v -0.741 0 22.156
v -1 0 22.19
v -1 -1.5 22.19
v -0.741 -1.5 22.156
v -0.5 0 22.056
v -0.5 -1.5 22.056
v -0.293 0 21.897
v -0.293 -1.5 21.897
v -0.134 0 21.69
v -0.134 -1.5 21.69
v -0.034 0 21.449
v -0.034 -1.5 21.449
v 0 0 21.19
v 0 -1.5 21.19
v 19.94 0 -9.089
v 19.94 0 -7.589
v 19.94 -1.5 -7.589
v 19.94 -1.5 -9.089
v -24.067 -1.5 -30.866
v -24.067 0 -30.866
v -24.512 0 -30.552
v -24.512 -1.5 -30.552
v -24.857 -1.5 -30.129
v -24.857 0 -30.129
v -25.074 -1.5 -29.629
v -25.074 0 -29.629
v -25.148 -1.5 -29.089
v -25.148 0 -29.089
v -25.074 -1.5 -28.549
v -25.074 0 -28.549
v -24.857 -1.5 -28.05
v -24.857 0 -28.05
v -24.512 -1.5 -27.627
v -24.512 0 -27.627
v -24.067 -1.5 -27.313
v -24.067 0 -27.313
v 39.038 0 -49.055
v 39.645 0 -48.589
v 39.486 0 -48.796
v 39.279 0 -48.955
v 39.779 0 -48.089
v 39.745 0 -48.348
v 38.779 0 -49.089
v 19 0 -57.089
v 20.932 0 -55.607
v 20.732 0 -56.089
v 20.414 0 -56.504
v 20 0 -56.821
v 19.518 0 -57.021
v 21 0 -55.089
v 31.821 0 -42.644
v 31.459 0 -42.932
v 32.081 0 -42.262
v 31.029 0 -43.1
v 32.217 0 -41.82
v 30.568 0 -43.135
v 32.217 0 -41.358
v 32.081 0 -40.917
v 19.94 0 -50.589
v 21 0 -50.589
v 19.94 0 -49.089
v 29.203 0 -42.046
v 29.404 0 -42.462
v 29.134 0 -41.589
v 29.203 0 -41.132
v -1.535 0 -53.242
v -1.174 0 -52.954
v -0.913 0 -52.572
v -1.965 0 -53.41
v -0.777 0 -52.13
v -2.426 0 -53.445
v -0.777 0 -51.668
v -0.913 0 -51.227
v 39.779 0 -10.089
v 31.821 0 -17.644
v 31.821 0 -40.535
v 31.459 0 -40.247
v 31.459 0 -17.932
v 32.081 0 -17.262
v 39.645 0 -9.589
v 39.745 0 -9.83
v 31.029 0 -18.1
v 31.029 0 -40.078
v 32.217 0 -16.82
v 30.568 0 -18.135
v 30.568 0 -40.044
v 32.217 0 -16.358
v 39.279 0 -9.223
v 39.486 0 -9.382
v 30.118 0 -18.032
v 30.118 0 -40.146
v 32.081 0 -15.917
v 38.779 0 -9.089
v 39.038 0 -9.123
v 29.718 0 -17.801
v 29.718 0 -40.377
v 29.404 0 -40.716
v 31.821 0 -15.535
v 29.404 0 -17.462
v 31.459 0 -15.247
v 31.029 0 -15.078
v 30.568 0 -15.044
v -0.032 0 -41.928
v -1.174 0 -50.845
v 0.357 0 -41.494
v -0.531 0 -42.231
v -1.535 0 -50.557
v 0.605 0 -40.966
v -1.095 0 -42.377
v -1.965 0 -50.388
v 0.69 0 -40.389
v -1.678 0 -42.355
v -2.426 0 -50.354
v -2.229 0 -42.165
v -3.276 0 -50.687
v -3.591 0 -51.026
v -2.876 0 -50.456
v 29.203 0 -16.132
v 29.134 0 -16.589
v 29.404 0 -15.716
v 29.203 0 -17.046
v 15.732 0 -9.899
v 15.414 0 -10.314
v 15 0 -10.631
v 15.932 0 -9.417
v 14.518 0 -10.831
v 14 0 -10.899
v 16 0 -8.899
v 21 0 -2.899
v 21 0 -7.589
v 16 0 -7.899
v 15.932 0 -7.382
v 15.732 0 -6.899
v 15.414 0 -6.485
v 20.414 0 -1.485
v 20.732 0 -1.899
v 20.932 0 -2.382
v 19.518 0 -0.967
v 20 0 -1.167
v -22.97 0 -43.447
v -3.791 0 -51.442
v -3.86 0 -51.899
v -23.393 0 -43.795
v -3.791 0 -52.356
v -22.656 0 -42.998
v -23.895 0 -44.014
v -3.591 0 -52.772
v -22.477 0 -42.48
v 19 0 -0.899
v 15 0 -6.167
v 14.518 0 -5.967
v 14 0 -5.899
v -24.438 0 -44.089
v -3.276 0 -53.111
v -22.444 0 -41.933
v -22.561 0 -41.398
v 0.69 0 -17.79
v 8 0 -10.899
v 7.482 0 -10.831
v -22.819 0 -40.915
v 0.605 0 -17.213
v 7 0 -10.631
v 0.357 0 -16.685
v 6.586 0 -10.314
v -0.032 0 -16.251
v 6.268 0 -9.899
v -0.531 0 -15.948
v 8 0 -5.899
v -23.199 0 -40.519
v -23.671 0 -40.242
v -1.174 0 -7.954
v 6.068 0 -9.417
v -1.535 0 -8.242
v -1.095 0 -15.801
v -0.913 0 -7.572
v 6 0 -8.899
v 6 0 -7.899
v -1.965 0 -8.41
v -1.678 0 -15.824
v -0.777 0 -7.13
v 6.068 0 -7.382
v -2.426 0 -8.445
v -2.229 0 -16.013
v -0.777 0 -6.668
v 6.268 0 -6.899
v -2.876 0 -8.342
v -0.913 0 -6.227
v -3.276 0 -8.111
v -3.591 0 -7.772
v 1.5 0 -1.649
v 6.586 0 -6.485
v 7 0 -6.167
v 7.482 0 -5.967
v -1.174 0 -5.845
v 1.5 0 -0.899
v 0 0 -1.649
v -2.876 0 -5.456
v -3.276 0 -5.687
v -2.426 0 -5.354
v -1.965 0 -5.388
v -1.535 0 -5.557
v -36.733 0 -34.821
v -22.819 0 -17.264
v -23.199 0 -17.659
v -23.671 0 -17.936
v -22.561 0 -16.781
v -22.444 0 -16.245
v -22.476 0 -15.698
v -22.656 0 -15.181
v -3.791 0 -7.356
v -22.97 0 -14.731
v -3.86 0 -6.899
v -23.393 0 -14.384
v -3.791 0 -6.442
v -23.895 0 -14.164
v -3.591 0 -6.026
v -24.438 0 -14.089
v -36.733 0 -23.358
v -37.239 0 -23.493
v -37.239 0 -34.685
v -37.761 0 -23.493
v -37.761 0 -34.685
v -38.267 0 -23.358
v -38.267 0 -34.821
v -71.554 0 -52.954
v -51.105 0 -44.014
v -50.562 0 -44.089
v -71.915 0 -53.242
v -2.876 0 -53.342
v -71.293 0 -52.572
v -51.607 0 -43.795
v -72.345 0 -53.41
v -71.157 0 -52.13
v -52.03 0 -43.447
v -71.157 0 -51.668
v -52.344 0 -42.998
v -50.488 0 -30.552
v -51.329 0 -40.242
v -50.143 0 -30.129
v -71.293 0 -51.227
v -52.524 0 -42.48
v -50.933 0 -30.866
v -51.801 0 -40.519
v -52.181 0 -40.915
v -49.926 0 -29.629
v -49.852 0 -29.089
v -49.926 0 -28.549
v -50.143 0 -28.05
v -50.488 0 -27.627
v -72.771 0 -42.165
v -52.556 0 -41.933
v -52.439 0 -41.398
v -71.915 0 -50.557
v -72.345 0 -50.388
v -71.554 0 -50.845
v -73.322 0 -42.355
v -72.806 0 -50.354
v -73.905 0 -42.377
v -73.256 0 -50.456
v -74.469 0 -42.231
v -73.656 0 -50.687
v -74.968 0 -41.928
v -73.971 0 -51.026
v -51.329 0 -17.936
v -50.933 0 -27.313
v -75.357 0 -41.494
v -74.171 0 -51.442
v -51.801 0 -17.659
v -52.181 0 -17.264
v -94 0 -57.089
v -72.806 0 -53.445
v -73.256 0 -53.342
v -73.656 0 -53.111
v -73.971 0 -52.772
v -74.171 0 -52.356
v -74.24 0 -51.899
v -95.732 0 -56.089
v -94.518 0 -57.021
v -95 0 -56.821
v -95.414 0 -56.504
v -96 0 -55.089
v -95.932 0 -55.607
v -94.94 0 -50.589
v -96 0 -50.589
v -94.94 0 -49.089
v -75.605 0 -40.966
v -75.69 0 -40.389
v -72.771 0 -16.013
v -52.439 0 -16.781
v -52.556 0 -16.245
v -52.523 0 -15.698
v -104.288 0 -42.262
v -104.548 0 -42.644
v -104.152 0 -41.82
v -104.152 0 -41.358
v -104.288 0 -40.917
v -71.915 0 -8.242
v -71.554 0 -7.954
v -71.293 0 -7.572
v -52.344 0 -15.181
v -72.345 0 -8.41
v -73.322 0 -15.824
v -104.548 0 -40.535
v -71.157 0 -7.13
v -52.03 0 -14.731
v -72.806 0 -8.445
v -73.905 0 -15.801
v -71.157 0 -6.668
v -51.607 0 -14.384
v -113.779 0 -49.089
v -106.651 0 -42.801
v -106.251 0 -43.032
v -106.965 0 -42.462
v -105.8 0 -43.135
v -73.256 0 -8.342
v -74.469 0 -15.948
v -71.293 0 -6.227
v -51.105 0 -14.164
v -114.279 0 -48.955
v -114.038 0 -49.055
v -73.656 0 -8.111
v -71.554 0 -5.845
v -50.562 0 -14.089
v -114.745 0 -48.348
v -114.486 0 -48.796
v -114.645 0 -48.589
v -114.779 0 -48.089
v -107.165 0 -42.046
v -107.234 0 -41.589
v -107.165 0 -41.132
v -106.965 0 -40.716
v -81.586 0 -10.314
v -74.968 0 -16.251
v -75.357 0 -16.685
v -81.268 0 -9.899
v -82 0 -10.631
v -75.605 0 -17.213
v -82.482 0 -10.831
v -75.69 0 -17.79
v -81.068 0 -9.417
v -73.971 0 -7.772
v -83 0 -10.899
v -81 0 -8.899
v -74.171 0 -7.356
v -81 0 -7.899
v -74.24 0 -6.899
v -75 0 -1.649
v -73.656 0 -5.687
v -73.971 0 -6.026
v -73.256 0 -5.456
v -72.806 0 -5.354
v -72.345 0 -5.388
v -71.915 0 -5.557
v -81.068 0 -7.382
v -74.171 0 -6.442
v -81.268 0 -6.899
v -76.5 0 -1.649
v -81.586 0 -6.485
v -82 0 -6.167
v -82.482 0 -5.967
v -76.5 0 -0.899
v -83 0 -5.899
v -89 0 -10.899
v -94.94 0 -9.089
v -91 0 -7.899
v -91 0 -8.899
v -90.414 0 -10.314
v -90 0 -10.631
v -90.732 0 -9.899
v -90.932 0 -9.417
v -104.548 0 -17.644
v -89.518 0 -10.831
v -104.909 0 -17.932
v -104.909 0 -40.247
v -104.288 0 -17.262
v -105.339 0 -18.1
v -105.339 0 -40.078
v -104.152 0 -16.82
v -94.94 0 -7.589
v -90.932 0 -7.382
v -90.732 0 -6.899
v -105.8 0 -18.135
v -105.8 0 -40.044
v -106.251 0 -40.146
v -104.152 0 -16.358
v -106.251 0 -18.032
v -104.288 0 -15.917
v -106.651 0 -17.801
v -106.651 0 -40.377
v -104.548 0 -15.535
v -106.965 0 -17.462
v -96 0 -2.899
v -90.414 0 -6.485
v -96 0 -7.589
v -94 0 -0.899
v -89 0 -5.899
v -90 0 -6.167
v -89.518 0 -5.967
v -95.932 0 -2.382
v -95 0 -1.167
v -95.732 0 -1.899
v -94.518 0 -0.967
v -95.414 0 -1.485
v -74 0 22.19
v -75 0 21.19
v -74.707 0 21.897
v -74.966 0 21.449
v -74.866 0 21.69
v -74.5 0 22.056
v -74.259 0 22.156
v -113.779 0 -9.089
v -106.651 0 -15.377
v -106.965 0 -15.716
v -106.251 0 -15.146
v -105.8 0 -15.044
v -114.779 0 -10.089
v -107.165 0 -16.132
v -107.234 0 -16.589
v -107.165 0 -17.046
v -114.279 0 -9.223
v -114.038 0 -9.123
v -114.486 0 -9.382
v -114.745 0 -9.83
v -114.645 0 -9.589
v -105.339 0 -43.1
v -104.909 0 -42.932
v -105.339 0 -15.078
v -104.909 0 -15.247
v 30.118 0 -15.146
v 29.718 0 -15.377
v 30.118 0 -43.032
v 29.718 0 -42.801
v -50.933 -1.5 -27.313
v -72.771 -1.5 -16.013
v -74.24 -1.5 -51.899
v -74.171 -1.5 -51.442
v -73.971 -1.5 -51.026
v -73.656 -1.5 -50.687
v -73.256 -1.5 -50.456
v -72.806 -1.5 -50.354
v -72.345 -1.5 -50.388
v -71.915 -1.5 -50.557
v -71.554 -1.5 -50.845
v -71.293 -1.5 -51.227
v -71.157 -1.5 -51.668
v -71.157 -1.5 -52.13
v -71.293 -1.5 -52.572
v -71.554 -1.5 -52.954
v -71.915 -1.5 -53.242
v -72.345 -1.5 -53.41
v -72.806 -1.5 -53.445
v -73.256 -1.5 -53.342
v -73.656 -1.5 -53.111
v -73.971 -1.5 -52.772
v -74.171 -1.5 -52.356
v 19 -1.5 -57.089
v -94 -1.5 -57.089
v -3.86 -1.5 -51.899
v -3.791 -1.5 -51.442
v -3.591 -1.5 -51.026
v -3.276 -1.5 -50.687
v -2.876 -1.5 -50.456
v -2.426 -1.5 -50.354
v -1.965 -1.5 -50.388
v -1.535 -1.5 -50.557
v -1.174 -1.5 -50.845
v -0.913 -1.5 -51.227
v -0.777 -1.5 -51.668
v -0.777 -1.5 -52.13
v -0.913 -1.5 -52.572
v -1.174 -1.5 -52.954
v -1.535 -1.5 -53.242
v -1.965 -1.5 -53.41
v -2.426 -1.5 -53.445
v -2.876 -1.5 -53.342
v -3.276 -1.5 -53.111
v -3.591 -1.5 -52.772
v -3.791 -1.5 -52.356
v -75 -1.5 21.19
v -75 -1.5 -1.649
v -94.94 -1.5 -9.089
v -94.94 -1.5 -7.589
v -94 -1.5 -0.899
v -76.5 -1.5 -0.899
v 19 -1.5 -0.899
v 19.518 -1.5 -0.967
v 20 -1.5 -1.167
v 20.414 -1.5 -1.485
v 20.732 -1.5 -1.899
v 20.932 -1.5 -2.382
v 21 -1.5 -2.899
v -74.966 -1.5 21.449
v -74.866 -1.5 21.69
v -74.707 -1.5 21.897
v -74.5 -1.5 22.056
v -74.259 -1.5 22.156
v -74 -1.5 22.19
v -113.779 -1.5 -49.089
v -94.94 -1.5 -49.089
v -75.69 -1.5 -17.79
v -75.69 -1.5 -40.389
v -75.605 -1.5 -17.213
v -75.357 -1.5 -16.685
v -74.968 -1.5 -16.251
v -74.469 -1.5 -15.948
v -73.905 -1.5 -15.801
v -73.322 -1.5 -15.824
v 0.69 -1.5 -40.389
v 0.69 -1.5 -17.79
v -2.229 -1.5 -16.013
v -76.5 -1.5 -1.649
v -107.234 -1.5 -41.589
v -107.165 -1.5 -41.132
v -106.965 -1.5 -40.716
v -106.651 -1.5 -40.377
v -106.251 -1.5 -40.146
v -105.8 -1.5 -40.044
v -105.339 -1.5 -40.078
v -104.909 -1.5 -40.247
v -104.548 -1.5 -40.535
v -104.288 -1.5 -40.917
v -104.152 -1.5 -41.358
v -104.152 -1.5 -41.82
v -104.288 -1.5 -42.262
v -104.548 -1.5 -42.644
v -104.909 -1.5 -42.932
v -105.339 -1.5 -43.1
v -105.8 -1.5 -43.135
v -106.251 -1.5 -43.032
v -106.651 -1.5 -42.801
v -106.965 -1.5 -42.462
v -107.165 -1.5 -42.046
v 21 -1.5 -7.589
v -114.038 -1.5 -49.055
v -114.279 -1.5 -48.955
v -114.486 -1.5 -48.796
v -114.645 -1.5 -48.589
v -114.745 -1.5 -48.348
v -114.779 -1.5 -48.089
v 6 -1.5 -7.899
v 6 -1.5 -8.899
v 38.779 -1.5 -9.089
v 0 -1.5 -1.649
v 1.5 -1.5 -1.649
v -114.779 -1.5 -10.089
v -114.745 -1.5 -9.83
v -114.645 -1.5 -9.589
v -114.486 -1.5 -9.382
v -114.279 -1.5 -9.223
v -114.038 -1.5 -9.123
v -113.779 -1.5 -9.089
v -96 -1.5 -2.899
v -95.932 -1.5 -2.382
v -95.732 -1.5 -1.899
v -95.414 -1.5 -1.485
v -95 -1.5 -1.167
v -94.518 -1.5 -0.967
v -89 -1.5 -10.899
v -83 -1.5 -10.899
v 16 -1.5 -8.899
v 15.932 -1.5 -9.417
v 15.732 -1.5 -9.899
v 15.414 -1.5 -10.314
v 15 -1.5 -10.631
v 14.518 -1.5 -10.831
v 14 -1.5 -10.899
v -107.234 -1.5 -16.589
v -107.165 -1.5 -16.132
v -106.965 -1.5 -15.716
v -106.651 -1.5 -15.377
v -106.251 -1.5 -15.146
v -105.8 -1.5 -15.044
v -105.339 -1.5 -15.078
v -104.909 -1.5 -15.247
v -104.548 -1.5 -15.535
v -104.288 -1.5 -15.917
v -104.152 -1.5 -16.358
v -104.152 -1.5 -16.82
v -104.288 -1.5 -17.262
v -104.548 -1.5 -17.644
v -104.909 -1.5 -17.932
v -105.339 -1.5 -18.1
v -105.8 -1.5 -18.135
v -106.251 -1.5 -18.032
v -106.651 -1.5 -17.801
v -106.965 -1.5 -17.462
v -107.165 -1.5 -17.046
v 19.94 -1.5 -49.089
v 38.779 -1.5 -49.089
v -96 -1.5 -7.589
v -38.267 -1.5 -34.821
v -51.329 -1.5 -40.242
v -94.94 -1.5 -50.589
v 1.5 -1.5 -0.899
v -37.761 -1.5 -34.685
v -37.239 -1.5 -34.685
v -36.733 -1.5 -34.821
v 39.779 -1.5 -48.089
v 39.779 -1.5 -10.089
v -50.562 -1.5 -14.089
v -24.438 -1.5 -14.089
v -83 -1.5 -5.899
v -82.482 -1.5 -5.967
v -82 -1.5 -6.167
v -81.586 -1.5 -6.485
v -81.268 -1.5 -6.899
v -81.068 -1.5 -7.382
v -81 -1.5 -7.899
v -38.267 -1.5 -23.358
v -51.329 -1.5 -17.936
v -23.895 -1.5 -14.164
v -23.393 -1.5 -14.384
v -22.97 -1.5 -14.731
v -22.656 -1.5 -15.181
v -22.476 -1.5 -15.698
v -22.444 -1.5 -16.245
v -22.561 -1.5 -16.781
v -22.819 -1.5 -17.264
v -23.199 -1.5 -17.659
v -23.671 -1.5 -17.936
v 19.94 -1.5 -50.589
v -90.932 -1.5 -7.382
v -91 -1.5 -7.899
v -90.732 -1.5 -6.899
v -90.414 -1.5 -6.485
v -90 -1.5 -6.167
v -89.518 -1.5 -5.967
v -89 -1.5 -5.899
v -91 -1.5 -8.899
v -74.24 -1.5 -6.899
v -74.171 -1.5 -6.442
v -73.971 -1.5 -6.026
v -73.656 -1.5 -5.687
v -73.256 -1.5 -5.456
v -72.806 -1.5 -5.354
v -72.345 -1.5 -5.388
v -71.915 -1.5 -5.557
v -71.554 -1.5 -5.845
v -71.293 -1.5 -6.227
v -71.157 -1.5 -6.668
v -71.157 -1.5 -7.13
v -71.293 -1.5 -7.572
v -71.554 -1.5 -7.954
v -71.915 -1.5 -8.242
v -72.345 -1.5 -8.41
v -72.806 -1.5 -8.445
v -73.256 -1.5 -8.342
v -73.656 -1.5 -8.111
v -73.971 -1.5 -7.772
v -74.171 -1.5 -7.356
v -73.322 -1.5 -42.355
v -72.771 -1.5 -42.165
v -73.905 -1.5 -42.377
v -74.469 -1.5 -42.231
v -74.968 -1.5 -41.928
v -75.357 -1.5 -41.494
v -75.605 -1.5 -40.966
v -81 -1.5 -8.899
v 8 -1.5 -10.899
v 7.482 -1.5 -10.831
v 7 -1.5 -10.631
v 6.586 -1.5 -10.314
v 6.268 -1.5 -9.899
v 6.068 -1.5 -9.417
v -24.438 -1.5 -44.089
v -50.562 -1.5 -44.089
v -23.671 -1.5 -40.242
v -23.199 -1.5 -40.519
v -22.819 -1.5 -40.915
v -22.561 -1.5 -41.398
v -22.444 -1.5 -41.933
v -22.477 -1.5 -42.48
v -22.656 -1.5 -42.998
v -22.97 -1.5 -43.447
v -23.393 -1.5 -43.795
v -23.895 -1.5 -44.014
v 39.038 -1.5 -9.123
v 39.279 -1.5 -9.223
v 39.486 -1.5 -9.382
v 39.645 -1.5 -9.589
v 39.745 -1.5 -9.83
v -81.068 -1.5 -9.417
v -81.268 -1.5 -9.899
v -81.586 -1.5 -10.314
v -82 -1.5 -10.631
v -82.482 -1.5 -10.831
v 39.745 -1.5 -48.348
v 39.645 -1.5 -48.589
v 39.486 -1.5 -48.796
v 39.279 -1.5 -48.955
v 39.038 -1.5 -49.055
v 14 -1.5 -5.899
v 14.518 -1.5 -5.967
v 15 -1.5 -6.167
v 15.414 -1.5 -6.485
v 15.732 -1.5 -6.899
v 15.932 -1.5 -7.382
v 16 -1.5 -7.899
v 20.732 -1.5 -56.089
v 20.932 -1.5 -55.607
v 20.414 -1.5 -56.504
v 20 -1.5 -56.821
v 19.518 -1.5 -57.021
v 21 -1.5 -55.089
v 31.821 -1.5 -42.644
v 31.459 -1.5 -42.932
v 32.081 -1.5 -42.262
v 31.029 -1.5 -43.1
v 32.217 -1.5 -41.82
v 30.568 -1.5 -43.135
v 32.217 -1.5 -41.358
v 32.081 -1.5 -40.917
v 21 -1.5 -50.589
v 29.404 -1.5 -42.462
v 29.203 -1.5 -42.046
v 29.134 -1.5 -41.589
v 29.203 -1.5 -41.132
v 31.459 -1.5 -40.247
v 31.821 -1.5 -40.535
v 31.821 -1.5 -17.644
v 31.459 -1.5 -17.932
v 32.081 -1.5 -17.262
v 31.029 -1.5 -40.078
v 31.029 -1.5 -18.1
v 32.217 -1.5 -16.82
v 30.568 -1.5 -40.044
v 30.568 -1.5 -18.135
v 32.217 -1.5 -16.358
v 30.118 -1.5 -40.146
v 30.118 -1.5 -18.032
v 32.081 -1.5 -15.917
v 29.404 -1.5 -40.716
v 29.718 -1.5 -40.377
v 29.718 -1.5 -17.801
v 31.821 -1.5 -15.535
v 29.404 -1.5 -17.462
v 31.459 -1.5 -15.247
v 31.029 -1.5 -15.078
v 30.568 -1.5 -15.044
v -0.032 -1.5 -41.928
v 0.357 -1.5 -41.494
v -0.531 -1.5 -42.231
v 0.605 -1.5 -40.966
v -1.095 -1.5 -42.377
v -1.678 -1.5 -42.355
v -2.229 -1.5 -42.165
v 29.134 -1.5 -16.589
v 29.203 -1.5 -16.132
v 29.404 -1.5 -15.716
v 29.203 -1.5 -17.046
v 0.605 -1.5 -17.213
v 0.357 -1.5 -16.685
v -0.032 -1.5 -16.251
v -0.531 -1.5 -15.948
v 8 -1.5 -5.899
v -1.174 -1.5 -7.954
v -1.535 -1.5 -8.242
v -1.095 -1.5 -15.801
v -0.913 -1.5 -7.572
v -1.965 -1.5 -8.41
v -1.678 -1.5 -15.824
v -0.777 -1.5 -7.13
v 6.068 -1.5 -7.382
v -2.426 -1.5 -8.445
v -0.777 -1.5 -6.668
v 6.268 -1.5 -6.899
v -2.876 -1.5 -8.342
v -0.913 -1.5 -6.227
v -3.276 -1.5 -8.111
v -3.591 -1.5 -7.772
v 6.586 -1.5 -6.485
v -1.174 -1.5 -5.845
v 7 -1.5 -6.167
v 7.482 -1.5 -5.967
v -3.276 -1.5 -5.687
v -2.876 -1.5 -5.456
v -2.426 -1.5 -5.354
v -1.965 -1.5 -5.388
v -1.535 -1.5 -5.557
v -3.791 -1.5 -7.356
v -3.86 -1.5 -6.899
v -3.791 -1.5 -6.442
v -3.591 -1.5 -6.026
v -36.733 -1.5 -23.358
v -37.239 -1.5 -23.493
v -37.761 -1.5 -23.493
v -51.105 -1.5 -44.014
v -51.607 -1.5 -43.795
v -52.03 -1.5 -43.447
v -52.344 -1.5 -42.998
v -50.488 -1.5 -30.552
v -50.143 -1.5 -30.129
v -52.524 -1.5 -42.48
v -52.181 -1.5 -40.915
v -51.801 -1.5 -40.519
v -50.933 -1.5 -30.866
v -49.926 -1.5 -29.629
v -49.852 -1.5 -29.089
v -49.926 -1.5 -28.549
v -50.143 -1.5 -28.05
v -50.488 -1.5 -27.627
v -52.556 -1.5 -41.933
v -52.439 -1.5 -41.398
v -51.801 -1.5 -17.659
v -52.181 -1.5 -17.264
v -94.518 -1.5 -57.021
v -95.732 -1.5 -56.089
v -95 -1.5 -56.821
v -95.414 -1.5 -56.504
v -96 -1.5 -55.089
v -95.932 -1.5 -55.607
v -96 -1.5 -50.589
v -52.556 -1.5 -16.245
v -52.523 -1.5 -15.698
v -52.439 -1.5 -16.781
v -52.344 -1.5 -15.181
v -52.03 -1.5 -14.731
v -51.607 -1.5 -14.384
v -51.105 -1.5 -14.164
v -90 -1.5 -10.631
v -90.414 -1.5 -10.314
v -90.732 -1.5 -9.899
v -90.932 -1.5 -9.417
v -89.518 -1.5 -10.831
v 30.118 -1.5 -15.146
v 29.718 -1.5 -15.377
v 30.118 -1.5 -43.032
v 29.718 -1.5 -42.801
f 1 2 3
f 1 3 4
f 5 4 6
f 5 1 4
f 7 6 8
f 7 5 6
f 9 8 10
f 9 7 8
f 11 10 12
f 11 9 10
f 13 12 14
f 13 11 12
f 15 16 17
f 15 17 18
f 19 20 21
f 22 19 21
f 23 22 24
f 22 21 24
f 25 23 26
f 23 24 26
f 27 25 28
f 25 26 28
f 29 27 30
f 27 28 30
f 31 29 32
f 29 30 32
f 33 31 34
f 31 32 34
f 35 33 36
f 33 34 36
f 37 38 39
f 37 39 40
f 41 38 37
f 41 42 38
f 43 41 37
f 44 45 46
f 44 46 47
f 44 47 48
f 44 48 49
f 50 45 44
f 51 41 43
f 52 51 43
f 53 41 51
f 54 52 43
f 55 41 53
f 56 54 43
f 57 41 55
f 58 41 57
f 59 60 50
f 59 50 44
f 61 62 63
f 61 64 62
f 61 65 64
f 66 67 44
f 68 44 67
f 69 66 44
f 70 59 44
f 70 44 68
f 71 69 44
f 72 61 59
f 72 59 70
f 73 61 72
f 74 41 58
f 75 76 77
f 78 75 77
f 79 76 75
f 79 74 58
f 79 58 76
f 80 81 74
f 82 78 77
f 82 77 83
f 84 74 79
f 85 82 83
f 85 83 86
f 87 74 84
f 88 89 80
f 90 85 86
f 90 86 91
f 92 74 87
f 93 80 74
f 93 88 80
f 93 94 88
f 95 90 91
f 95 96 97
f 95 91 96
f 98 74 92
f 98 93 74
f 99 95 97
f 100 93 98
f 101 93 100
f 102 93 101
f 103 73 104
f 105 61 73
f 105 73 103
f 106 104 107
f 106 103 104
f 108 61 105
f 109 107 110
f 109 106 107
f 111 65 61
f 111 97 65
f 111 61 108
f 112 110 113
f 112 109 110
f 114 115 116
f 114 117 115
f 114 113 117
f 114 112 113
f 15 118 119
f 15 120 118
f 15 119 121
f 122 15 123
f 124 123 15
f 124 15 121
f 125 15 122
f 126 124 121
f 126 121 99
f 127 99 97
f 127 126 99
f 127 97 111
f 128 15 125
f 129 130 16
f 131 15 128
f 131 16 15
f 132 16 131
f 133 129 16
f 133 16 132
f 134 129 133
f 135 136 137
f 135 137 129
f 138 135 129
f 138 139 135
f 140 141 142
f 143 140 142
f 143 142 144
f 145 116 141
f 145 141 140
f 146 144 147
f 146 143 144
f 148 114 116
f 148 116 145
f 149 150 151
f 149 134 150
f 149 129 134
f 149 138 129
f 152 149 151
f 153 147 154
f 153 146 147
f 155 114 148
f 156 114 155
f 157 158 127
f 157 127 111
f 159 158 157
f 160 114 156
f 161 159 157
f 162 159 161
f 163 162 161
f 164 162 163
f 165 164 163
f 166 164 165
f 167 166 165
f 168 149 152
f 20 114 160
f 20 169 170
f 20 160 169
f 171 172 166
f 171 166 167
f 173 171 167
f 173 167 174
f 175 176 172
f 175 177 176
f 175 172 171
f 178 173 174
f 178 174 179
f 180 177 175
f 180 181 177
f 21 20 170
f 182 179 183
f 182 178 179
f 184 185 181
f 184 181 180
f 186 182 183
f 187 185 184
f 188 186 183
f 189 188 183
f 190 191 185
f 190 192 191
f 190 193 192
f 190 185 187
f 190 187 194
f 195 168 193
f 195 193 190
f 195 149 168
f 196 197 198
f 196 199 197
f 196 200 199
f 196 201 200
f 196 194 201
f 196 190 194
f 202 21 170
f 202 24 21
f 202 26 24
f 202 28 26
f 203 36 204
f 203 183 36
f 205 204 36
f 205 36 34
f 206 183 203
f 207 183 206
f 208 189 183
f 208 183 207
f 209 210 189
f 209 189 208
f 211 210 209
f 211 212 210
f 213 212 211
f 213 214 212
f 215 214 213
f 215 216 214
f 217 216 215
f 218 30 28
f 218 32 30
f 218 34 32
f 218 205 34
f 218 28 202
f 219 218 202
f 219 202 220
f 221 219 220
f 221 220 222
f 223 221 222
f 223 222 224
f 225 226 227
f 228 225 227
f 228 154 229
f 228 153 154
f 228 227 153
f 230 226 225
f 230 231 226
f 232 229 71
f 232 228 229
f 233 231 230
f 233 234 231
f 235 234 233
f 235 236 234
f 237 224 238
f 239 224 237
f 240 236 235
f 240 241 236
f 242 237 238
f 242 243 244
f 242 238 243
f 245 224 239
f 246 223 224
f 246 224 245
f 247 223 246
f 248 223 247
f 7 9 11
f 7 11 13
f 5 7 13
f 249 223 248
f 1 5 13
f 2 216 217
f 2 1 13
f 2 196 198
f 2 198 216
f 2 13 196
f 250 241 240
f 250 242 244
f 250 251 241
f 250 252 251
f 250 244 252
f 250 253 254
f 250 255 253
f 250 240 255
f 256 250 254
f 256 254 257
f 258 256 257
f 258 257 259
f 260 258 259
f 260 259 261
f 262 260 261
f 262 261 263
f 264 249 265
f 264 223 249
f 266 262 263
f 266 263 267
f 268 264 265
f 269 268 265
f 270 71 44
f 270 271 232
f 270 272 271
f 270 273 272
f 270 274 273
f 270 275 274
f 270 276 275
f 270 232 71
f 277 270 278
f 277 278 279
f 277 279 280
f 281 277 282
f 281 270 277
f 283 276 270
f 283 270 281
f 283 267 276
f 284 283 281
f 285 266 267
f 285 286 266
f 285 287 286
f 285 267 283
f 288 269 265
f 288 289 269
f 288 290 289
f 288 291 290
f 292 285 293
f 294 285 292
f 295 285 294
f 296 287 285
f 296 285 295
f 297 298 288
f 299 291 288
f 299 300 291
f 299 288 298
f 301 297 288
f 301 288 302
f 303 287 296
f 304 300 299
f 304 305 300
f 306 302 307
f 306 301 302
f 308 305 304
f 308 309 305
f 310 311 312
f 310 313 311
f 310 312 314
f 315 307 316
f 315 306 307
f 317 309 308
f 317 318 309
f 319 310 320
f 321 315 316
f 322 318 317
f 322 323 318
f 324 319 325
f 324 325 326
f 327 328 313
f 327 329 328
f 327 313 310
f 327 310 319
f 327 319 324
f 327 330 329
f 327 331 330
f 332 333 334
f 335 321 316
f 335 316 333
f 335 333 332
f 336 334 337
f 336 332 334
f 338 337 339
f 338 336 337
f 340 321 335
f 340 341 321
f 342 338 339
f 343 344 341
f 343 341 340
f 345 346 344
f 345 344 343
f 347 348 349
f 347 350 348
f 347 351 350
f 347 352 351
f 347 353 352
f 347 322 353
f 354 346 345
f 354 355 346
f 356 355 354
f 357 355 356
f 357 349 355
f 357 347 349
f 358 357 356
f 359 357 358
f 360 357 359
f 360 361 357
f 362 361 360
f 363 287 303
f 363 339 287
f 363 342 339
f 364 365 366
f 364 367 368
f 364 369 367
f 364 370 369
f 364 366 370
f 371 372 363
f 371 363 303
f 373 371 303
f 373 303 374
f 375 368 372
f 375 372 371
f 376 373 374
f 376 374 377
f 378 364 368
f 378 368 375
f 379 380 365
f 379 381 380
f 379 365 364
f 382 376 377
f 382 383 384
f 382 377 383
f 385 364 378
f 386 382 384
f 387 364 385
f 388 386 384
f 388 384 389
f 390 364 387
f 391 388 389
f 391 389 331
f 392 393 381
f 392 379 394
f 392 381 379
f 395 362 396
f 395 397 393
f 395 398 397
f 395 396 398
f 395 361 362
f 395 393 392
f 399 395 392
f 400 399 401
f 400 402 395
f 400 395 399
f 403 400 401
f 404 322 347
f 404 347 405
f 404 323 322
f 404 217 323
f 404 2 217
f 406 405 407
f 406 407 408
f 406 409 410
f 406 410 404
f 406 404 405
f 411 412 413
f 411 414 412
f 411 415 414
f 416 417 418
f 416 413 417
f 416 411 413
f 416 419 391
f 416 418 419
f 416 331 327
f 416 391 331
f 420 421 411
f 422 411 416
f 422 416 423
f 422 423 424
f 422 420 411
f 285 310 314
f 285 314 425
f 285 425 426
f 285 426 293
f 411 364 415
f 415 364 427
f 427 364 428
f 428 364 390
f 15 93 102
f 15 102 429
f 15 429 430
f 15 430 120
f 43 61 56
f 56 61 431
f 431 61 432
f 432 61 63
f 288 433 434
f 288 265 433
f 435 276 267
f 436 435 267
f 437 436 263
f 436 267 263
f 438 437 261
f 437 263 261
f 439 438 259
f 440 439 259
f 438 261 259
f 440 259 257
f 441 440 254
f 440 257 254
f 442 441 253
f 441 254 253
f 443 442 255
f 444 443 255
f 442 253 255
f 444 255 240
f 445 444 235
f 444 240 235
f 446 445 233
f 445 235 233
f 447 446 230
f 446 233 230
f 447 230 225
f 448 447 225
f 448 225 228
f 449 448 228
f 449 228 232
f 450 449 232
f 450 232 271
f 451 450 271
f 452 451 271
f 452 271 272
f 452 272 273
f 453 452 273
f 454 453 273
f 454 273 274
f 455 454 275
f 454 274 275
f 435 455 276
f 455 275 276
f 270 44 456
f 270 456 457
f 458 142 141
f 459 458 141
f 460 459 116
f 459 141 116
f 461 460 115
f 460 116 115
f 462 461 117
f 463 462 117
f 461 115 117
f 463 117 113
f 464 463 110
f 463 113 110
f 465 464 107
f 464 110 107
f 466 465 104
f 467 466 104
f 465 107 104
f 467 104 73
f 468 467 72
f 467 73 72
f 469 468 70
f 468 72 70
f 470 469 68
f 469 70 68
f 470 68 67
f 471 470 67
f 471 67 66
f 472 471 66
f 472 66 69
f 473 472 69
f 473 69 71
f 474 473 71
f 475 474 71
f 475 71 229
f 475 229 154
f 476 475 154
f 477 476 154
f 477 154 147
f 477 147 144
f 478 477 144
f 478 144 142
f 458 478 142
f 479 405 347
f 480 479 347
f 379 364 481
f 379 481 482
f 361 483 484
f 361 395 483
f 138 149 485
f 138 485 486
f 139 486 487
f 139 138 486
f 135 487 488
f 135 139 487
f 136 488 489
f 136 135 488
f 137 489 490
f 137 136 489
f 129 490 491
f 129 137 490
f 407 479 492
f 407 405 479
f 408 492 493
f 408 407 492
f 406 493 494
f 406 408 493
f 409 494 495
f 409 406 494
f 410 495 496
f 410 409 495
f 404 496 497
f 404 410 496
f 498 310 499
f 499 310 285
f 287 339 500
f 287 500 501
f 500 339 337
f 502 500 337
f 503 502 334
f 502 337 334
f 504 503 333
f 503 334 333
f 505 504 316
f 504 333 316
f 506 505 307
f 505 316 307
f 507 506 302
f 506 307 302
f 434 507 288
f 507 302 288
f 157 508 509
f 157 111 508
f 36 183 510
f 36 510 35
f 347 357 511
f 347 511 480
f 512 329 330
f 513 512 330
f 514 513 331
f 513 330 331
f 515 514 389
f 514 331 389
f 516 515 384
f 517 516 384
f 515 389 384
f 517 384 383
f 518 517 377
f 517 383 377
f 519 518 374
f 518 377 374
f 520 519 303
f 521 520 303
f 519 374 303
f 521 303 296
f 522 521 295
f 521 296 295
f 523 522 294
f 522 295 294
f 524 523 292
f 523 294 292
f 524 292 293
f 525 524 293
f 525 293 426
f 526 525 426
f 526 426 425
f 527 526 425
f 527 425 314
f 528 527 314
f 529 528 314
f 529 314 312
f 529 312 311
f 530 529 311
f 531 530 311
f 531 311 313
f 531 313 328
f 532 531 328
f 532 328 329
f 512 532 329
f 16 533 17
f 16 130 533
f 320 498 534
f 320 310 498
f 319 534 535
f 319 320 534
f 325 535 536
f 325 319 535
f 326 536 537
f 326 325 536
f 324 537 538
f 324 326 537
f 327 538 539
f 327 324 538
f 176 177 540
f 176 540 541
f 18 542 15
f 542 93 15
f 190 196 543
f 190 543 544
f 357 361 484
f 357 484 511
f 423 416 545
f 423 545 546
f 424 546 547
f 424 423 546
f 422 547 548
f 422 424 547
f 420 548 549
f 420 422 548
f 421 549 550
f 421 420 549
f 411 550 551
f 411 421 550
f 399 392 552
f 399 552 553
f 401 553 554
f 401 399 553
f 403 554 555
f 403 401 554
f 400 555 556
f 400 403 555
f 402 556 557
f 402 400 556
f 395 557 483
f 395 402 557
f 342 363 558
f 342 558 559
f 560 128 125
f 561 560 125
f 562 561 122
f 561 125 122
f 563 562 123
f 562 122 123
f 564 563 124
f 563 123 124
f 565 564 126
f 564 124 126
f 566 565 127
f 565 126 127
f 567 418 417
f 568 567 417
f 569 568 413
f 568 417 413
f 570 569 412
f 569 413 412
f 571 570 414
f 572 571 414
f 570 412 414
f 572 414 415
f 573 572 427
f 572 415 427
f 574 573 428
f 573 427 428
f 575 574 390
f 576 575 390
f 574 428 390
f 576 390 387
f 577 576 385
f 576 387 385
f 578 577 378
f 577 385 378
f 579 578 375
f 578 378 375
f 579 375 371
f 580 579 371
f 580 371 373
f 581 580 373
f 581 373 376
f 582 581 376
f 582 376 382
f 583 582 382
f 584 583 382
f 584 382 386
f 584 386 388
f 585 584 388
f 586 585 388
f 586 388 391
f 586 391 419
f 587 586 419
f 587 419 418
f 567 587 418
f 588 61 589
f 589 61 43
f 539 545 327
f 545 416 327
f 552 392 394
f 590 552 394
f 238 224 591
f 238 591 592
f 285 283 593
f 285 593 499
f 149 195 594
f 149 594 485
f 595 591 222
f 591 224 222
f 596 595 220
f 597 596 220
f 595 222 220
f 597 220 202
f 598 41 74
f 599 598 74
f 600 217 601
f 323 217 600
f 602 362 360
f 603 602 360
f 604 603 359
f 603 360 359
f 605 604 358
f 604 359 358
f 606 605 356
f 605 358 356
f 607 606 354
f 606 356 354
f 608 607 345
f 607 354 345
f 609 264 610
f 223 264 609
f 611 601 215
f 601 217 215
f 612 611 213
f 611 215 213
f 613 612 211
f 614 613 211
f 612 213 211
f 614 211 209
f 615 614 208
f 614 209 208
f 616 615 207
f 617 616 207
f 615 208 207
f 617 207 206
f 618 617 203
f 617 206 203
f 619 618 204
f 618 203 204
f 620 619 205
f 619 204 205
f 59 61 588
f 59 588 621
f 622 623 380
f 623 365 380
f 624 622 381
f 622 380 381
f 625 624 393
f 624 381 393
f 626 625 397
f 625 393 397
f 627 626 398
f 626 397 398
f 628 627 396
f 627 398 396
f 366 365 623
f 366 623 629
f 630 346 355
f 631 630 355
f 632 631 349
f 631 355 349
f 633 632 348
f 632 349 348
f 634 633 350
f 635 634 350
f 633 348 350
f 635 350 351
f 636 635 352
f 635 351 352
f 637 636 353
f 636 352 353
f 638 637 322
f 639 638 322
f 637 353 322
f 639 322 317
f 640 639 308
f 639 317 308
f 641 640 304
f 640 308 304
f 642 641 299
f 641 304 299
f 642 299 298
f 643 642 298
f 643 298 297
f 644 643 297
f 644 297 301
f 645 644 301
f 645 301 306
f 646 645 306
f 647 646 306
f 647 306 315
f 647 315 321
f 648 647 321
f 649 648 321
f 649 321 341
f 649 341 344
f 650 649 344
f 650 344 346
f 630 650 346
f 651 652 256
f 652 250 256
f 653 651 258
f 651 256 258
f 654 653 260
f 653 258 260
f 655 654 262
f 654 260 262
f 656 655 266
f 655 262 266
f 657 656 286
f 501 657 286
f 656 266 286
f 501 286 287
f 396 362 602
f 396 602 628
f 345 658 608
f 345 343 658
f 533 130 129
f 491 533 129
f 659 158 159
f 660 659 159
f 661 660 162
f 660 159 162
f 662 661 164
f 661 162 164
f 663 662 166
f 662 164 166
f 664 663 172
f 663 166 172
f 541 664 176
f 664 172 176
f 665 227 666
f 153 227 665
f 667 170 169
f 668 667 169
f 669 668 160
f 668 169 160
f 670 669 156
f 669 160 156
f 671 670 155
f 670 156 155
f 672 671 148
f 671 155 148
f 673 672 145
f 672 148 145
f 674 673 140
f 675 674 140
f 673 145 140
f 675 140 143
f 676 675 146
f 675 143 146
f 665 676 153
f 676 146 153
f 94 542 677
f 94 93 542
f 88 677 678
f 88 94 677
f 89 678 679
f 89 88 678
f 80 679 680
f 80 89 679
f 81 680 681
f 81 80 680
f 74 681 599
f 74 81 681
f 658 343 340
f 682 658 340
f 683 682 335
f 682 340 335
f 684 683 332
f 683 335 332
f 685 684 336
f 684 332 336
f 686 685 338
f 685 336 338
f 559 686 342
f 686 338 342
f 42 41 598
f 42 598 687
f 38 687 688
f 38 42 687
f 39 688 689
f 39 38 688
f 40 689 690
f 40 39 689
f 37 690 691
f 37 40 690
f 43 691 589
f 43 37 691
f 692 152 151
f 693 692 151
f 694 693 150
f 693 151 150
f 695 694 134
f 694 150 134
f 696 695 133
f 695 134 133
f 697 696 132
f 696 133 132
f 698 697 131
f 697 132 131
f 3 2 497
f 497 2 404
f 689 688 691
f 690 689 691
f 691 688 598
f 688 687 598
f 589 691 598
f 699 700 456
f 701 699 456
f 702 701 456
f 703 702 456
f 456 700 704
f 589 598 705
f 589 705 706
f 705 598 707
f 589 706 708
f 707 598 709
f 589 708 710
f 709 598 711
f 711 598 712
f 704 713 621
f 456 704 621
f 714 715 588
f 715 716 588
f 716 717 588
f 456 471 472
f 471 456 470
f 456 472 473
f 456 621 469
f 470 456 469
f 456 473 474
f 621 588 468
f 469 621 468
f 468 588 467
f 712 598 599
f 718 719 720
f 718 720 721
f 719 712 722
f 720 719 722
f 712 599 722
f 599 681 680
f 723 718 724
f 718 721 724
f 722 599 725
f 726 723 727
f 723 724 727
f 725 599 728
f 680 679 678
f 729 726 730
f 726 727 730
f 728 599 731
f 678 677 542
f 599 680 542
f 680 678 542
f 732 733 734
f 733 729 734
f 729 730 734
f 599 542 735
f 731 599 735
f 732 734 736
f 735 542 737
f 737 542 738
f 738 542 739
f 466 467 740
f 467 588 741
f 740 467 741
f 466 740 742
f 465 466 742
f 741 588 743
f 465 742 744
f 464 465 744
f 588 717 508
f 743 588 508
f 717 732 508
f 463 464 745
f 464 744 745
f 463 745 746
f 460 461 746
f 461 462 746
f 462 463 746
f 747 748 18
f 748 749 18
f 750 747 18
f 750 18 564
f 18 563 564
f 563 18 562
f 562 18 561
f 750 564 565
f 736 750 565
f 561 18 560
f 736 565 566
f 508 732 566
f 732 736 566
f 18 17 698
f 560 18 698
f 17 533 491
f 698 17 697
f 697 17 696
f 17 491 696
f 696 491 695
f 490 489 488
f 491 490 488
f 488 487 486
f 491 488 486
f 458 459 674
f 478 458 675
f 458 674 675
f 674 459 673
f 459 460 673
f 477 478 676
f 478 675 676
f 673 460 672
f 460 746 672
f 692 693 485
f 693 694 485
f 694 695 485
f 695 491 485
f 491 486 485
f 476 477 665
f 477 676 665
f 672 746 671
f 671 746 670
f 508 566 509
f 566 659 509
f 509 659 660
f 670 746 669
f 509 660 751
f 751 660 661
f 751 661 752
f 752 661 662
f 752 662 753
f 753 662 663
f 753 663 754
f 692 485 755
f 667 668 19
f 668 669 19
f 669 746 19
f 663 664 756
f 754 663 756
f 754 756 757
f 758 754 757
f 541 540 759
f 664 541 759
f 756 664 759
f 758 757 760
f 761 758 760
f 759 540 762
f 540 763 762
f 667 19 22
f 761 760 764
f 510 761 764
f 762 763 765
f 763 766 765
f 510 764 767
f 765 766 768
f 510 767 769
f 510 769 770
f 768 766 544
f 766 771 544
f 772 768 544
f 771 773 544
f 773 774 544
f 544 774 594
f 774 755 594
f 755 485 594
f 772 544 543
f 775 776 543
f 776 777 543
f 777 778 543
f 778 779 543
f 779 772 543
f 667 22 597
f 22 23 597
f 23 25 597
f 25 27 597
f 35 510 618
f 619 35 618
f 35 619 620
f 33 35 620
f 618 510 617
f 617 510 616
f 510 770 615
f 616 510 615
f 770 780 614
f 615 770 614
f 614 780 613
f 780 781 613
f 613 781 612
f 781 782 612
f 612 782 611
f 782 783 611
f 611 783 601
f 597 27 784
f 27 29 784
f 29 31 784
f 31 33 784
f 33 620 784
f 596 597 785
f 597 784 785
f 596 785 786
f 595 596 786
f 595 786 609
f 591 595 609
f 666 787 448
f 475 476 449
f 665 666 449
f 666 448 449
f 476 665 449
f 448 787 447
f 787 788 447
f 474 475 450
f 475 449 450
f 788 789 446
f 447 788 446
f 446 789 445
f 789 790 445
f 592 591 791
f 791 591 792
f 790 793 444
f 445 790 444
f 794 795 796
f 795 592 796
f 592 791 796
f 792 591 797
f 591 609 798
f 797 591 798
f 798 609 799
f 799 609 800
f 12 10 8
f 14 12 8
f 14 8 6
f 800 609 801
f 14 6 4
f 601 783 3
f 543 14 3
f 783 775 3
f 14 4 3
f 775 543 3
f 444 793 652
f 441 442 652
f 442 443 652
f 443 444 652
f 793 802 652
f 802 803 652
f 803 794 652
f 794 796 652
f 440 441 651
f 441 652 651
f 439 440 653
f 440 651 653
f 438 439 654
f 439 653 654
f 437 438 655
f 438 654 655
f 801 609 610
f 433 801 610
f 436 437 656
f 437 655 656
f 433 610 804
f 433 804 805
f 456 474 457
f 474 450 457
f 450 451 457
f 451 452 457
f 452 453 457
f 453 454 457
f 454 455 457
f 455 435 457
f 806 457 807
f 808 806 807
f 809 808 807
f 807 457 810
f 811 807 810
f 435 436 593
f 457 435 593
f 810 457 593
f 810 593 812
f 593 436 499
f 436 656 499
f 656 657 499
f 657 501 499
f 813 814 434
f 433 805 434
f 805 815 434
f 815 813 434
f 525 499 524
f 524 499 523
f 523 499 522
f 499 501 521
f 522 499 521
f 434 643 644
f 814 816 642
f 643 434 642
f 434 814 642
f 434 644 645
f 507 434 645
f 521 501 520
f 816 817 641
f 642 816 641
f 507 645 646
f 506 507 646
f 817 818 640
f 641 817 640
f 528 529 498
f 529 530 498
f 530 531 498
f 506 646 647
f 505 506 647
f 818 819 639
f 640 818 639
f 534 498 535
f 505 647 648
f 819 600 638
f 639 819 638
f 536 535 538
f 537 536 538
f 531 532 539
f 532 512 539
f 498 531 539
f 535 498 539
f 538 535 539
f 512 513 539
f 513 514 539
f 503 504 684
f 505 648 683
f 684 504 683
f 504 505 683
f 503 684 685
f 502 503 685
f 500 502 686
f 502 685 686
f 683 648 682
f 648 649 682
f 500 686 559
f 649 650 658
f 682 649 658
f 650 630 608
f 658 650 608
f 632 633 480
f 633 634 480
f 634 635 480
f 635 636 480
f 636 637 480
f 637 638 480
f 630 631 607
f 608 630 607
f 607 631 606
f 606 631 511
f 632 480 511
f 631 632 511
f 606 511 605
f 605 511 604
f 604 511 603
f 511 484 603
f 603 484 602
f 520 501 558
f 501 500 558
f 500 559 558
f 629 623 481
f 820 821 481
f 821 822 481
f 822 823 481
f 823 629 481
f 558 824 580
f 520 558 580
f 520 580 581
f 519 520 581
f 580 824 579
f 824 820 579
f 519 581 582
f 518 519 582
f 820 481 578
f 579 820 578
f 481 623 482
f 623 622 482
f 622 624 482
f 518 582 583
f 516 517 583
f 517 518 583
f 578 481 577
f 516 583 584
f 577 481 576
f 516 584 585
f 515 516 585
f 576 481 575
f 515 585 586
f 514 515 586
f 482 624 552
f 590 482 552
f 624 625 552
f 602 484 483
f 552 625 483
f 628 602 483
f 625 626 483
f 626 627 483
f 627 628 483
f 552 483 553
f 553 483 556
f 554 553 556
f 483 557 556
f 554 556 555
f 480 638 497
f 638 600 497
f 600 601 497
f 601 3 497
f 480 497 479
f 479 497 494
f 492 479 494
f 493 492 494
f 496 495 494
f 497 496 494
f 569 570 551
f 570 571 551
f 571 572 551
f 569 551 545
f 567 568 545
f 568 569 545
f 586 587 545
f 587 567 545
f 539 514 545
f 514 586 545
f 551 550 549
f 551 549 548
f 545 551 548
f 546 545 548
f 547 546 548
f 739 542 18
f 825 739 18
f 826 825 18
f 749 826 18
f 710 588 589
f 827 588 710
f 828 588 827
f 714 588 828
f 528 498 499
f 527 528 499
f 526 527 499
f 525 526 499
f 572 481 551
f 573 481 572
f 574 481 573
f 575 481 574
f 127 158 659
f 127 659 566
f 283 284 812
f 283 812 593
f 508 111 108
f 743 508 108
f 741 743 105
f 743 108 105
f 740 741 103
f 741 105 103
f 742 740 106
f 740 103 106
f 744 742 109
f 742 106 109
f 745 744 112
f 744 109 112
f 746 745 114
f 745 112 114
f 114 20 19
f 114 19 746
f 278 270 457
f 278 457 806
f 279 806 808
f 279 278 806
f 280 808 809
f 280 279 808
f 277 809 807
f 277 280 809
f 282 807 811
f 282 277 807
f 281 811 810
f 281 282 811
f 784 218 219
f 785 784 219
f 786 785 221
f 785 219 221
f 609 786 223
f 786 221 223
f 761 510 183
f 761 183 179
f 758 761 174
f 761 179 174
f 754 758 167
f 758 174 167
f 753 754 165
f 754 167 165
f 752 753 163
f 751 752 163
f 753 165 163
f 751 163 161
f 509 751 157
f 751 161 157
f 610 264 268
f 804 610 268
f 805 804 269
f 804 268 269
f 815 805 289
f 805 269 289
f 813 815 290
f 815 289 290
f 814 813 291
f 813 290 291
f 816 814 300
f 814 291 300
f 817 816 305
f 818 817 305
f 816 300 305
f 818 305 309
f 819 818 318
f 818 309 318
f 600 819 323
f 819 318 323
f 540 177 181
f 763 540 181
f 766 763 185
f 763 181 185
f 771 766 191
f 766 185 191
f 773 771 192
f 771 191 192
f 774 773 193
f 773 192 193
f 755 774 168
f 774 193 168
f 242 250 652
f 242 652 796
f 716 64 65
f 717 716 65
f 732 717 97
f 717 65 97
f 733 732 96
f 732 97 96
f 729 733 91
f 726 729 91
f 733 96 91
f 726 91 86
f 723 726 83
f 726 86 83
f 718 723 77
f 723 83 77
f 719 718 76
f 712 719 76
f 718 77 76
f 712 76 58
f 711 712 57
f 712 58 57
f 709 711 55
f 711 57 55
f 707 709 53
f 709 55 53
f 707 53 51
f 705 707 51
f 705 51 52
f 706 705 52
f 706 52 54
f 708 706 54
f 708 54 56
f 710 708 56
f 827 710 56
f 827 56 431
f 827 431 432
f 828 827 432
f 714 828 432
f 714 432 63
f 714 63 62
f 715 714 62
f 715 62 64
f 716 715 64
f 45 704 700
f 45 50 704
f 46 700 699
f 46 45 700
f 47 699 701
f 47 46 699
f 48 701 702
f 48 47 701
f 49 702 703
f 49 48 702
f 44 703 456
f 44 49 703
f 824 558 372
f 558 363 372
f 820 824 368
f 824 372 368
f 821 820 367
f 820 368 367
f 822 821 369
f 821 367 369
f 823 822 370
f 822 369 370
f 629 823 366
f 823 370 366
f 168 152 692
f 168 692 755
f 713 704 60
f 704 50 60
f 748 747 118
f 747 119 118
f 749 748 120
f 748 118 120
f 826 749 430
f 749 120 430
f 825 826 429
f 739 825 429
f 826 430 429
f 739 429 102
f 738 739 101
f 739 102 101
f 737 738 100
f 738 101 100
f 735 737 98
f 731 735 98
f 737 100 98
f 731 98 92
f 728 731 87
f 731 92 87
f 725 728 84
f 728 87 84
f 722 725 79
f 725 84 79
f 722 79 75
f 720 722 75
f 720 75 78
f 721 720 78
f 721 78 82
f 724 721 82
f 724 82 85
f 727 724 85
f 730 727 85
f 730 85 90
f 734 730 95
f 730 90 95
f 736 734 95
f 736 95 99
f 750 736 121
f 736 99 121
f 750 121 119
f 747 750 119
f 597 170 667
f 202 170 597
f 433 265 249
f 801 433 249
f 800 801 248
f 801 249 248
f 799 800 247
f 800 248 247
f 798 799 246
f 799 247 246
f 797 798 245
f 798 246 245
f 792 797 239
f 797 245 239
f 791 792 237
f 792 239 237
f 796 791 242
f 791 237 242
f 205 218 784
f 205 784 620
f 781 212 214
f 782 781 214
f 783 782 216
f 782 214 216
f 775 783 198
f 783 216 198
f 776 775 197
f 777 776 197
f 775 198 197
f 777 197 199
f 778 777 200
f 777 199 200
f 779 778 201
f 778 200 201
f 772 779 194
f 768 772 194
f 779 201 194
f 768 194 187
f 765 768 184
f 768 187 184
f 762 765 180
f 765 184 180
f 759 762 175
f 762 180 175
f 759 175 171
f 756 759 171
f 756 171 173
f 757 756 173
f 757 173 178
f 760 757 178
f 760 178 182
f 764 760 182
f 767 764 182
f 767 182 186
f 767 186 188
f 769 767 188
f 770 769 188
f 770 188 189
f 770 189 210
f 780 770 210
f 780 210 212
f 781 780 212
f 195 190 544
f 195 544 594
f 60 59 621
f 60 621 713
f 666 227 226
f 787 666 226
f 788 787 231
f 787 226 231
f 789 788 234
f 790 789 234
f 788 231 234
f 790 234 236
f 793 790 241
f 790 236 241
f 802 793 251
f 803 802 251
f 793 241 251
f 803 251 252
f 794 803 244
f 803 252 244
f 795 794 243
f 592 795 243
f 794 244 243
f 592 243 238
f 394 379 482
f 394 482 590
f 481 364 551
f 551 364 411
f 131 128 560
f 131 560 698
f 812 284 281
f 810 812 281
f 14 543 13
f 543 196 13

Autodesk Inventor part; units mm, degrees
ref_plane "YZ Plane" through (0, 0, 0) normal (1, 0, 0) x (0, 1, 0)
ref_plane "XZ Plane" through (0, 0, 0) normal (0, 1, 0) x (-1, 0, 0)
ref_plane "XY Plane" through (0, 0, 0) normal (0, 0, 1) x (1, 0, 0)
sketch "Sketch1" plane through (0, 0, 0) normal (0, 1, 0) x (-1, 0, 0)
  line L0 (75, -0.4496) -> (0, -0.4496)
  line L1 (-21.1396, -9.0893) -> (-21.1396, -49.0893)
  line L2 (96.1396, -49.0893) -> (96.1396, -9.0893)
  circle A0 centre (72.69, -51.8993) radius 1.55
  circle A1 centre (2.31, -51.8993) radius 1.55
  circle A2 centre (72.69, -6.8993) radius 1.55
  circle A3 centre (2.31, -6.8993) radius 1.55
  arc A4 (-6, -7.8993) -> (-8, -5.8993) centre (-8, -7.8993) ccw
  line L3 (-14, -5.8993) -> (-8, -5.8993)
  arc A5 (-8, -10.8993) -> (-6, -8.8993) centre (-8, -8.8993) ccw
  line L4 (-6, -7.8993) -> (-6, -8.8993)
  arc A6 (-16, -8.8993) -> (-14, -10.8993) centre (-14, -8.8993) ccw
  line L5 (-16, -8.8993) -> (-16, -7.8993)
  arc A7 (-14, -5.8993) -> (-16, -7.8993) centre (-14, -7.8993) ccw
  arc A8 (89, -10.8993) -> (91, -8.8993) centre (89, -8.8993) ccw
  line L6 (91, -7.8993) -> (91, -8.8993)
  arc A9 (81, -8.8993) -> (83, -10.8993) centre (83, -8.8993) ccw
  line L7 (81, -8.8993) -> (81, -7.8993)
  arc A10 (91, -7.8993) -> (89, -5.8993) centre (89, -7.8993) ccw
  line L8 (83, -5.8993) -> (89, -5.8993)
  arc A11 (83, -5.8993) -> (81, -7.8993) centre (83, -7.8993) ccw
  arc A12 (2.2291, -16.0132) -> (-0.69, -17.7895) centre (1.31, -17.7895) ccw
  line L9 (-0.69, -40.389) -> (-0.69, -17.7895)
  arc A13 (24.0671, -30.8656) -> (24.0671, -27.313) centre (23.148, -29.0893) ccw
  line L10 (2.2291, -16.0132) -> (24.0671, -27.313)
  arc A14 (-0.69, -40.389) -> (2.2291, -42.1653) centre (1.31, -40.389) ccw
  line L11 (24.0671, -30.8656) -> (2.2291, -42.1653)
  arc A15 (23.6713, -40.2421) -> (24.4379, -44.0893) centre (24.4379, -42.0893) ccw
  line L12 (23.6713, -40.2421) -> (36.7334, -34.821)
  arc A16 (50.5621, -44.0893) -> (51.3287, -40.2421) centre (50.5621, -42.0893) ccw
  line L13 (38.2666, -34.821) -> (51.3287, -40.2421)
  arc A17 (38.2666, -34.821) -> (36.7334, -34.821) centre (37.5, -36.6682) ccw
  arc A18 (50.9329, -27.313) -> (50.9329, -30.8656) centre (51.852, -29.0893) ccw
  line L14 (50.9329, -27.313) -> (72.7709, -16.0132)
  arc A19 (75.69, -17.7895) -> (72.7709, -16.0132) centre (73.69, -17.7895) ccw
  line L15 (75.69, -17.7895) -> (75.69, -40.389)
  arc A20 (72.7709, -42.1653) -> (75.69, -40.389) centre (73.69, -40.389) ccw
  arc A21 (36.7334, -23.3576) -> (38.2666, -23.3576) centre (37.5, -21.5104) ccw
  line L16 (51.3287, -17.9365) -> (38.2666, -23.3576)
  arc A22 (51.3287, -17.9365) -> (50.5621, -14.0893) centre (50.5621, -16.0893) ccw
  line L17 (24.4379, -14.0893) -> (50.5621, -14.0893)
  arc A23 (24.4379, -14.0893) -> (23.6713, -17.9365) centre (24.4379, -16.0893) ccw
  line L18 (36.7334, -23.3576) -> (23.6713, -17.9365)
  line L19 (89, -10.8993) -> (83, -10.8993)
  line L20 (-8, -10.8993) -> (-14, -10.8993)
  circle A24 centre (-30.6843, -41.5893) radius 1.55
  circle A25 centre (105.6843, -41.5893) radius 1.55
  circle A26 centre (-30.6843, -16.5893) radius 1.55
  circle A27 centre (105.6843, -16.5893) radius 1.55
  line L21 (72.7709, -42.1653) -> (50.9329, -30.8656)
  line L22 (50.5621, -44.0893) -> (24.4379, -44.0893)
  arc A28 (-21, -55.0893) -> (-19, -57.0893) centre (-19, -55.0893) ccw
  line L23 (-19, -57.0893) -> (94, -57.0893)
  arc A29 (94, -57.0893) -> (96, -55.0893) centre (94, -55.0893) ccw
  line L24 (96, -50.5893) -> (96, -55.0893)
  arc A30 (96, -2.8993) -> (94, -0.8993) centre (94, -2.8993) ccw
  line L25 (94, -0.8993) -> (76.5, -0.8993)
  arc A31 (-19, -0.8993) -> (-21, -2.8993) centre (-19, -2.8993) ccw
  line L26 (-1.5, -0.8993) -> (-19, -0.8993)
  line L27 (96, -2.8993) -> (96, -7.5893)
  line L28 (-1.5, -1.6493) -> (-1.5, -0.8993)
  arc A32 (113.7793, -49.0893) -> (114.7793, -48.0893) centre (113.7793, -48.0893) ccw
  line L29 (114.7793, -10.0893) -> (114.7793, -48.0893)
  arc A33 (114.7793, -10.0893) -> (113.7793, -9.0893) centre (113.7793, -10.0893) ccw
  arc A34 (75, 21.19) -> (74, 22.19) centre (74, 21.19) ccw
  line L30 (1, 22.19) -> (74, 22.19)
  arc A35 (-39.7793, -48.0893) -> (-38.7793, -49.0893) centre (-38.7793, -48.0893) ccw
  arc A36 (-38.7793, -9.0893) -> (-39.7793, -10.0893) centre (-38.7793, -10.0893) ccw
  line L31 (-38.7793, -9.0893) -> (-19.94, -9.0893)
  arc A37 (1, 22.19) -> (0, 21.19) centre (1, 21.19) ccw
  line L32 (113.7793, -49.0893) -> (94.94, -49.0893)
  line L33 (-39.7793, -48.0893) -> (-39.7793, -10.0893)
  line L34 (96, -50.5893) -> (94.94, -50.5893)
  line L35 (94.94, -50.5893) -> (94.94, -49.0893)
  line L36 (94.94, -7.5893) -> (96, -7.5893)
  line L37 (94.94, -9.0893) -> (113.7793, -9.0893)
  line L38 (94.94, -9.0893) -> (94.94, -7.5893)
  line L39 (-21, -7.5893) -> (-19.94, -7.5893)
  line L40 (-19.94, -7.5893) -> (-19.94, -9.0893)
  line L41 (-21, -7.5893) -> (-21, -2.8993)
  line L42 (-19.94, -50.5893) -> (-21, -50.5893)
  line L43 (-19.94, -49.0893) -> (-38.7793, -49.0893)
  line L44 (-19.94, -49.0893) -> (-19.94, -50.5893)
  line L45 (-21, -55.0893) -> (-21, -50.5893)
  line L46 (75, 21.19) -> (75, -1.6493)
  line L47 (0, -1.6493) -> (0, 21.19)
  line L48 (0, -1.6493) -> (-1.5, -1.6493)
  line L49 (76.5, -0.8993) -> (76.5, -1.6493)
  line L50 (76.5, -1.6493) -> (75, -1.6493)
  line L51 (96.5893, -9.0893) -> (96.5893, -49.0893)
  line L52 (-21.5893, -49.0893) -> (-21.5893, -9.0893)
  line L53 (95.69, -49.0893) -> (95.69, -9.0893)
  line L54 (-20.69, -9.0893) -> (-20.69, -49.0893)
  line L55 (75, -0.8993) -> (0, -0.8993)
  line L56 (0, 0) -> (75, 0)
extrude "Extrusion1" add sketch "Sketch1" against normal blind 1.5
properties part number "body_back_frame"
